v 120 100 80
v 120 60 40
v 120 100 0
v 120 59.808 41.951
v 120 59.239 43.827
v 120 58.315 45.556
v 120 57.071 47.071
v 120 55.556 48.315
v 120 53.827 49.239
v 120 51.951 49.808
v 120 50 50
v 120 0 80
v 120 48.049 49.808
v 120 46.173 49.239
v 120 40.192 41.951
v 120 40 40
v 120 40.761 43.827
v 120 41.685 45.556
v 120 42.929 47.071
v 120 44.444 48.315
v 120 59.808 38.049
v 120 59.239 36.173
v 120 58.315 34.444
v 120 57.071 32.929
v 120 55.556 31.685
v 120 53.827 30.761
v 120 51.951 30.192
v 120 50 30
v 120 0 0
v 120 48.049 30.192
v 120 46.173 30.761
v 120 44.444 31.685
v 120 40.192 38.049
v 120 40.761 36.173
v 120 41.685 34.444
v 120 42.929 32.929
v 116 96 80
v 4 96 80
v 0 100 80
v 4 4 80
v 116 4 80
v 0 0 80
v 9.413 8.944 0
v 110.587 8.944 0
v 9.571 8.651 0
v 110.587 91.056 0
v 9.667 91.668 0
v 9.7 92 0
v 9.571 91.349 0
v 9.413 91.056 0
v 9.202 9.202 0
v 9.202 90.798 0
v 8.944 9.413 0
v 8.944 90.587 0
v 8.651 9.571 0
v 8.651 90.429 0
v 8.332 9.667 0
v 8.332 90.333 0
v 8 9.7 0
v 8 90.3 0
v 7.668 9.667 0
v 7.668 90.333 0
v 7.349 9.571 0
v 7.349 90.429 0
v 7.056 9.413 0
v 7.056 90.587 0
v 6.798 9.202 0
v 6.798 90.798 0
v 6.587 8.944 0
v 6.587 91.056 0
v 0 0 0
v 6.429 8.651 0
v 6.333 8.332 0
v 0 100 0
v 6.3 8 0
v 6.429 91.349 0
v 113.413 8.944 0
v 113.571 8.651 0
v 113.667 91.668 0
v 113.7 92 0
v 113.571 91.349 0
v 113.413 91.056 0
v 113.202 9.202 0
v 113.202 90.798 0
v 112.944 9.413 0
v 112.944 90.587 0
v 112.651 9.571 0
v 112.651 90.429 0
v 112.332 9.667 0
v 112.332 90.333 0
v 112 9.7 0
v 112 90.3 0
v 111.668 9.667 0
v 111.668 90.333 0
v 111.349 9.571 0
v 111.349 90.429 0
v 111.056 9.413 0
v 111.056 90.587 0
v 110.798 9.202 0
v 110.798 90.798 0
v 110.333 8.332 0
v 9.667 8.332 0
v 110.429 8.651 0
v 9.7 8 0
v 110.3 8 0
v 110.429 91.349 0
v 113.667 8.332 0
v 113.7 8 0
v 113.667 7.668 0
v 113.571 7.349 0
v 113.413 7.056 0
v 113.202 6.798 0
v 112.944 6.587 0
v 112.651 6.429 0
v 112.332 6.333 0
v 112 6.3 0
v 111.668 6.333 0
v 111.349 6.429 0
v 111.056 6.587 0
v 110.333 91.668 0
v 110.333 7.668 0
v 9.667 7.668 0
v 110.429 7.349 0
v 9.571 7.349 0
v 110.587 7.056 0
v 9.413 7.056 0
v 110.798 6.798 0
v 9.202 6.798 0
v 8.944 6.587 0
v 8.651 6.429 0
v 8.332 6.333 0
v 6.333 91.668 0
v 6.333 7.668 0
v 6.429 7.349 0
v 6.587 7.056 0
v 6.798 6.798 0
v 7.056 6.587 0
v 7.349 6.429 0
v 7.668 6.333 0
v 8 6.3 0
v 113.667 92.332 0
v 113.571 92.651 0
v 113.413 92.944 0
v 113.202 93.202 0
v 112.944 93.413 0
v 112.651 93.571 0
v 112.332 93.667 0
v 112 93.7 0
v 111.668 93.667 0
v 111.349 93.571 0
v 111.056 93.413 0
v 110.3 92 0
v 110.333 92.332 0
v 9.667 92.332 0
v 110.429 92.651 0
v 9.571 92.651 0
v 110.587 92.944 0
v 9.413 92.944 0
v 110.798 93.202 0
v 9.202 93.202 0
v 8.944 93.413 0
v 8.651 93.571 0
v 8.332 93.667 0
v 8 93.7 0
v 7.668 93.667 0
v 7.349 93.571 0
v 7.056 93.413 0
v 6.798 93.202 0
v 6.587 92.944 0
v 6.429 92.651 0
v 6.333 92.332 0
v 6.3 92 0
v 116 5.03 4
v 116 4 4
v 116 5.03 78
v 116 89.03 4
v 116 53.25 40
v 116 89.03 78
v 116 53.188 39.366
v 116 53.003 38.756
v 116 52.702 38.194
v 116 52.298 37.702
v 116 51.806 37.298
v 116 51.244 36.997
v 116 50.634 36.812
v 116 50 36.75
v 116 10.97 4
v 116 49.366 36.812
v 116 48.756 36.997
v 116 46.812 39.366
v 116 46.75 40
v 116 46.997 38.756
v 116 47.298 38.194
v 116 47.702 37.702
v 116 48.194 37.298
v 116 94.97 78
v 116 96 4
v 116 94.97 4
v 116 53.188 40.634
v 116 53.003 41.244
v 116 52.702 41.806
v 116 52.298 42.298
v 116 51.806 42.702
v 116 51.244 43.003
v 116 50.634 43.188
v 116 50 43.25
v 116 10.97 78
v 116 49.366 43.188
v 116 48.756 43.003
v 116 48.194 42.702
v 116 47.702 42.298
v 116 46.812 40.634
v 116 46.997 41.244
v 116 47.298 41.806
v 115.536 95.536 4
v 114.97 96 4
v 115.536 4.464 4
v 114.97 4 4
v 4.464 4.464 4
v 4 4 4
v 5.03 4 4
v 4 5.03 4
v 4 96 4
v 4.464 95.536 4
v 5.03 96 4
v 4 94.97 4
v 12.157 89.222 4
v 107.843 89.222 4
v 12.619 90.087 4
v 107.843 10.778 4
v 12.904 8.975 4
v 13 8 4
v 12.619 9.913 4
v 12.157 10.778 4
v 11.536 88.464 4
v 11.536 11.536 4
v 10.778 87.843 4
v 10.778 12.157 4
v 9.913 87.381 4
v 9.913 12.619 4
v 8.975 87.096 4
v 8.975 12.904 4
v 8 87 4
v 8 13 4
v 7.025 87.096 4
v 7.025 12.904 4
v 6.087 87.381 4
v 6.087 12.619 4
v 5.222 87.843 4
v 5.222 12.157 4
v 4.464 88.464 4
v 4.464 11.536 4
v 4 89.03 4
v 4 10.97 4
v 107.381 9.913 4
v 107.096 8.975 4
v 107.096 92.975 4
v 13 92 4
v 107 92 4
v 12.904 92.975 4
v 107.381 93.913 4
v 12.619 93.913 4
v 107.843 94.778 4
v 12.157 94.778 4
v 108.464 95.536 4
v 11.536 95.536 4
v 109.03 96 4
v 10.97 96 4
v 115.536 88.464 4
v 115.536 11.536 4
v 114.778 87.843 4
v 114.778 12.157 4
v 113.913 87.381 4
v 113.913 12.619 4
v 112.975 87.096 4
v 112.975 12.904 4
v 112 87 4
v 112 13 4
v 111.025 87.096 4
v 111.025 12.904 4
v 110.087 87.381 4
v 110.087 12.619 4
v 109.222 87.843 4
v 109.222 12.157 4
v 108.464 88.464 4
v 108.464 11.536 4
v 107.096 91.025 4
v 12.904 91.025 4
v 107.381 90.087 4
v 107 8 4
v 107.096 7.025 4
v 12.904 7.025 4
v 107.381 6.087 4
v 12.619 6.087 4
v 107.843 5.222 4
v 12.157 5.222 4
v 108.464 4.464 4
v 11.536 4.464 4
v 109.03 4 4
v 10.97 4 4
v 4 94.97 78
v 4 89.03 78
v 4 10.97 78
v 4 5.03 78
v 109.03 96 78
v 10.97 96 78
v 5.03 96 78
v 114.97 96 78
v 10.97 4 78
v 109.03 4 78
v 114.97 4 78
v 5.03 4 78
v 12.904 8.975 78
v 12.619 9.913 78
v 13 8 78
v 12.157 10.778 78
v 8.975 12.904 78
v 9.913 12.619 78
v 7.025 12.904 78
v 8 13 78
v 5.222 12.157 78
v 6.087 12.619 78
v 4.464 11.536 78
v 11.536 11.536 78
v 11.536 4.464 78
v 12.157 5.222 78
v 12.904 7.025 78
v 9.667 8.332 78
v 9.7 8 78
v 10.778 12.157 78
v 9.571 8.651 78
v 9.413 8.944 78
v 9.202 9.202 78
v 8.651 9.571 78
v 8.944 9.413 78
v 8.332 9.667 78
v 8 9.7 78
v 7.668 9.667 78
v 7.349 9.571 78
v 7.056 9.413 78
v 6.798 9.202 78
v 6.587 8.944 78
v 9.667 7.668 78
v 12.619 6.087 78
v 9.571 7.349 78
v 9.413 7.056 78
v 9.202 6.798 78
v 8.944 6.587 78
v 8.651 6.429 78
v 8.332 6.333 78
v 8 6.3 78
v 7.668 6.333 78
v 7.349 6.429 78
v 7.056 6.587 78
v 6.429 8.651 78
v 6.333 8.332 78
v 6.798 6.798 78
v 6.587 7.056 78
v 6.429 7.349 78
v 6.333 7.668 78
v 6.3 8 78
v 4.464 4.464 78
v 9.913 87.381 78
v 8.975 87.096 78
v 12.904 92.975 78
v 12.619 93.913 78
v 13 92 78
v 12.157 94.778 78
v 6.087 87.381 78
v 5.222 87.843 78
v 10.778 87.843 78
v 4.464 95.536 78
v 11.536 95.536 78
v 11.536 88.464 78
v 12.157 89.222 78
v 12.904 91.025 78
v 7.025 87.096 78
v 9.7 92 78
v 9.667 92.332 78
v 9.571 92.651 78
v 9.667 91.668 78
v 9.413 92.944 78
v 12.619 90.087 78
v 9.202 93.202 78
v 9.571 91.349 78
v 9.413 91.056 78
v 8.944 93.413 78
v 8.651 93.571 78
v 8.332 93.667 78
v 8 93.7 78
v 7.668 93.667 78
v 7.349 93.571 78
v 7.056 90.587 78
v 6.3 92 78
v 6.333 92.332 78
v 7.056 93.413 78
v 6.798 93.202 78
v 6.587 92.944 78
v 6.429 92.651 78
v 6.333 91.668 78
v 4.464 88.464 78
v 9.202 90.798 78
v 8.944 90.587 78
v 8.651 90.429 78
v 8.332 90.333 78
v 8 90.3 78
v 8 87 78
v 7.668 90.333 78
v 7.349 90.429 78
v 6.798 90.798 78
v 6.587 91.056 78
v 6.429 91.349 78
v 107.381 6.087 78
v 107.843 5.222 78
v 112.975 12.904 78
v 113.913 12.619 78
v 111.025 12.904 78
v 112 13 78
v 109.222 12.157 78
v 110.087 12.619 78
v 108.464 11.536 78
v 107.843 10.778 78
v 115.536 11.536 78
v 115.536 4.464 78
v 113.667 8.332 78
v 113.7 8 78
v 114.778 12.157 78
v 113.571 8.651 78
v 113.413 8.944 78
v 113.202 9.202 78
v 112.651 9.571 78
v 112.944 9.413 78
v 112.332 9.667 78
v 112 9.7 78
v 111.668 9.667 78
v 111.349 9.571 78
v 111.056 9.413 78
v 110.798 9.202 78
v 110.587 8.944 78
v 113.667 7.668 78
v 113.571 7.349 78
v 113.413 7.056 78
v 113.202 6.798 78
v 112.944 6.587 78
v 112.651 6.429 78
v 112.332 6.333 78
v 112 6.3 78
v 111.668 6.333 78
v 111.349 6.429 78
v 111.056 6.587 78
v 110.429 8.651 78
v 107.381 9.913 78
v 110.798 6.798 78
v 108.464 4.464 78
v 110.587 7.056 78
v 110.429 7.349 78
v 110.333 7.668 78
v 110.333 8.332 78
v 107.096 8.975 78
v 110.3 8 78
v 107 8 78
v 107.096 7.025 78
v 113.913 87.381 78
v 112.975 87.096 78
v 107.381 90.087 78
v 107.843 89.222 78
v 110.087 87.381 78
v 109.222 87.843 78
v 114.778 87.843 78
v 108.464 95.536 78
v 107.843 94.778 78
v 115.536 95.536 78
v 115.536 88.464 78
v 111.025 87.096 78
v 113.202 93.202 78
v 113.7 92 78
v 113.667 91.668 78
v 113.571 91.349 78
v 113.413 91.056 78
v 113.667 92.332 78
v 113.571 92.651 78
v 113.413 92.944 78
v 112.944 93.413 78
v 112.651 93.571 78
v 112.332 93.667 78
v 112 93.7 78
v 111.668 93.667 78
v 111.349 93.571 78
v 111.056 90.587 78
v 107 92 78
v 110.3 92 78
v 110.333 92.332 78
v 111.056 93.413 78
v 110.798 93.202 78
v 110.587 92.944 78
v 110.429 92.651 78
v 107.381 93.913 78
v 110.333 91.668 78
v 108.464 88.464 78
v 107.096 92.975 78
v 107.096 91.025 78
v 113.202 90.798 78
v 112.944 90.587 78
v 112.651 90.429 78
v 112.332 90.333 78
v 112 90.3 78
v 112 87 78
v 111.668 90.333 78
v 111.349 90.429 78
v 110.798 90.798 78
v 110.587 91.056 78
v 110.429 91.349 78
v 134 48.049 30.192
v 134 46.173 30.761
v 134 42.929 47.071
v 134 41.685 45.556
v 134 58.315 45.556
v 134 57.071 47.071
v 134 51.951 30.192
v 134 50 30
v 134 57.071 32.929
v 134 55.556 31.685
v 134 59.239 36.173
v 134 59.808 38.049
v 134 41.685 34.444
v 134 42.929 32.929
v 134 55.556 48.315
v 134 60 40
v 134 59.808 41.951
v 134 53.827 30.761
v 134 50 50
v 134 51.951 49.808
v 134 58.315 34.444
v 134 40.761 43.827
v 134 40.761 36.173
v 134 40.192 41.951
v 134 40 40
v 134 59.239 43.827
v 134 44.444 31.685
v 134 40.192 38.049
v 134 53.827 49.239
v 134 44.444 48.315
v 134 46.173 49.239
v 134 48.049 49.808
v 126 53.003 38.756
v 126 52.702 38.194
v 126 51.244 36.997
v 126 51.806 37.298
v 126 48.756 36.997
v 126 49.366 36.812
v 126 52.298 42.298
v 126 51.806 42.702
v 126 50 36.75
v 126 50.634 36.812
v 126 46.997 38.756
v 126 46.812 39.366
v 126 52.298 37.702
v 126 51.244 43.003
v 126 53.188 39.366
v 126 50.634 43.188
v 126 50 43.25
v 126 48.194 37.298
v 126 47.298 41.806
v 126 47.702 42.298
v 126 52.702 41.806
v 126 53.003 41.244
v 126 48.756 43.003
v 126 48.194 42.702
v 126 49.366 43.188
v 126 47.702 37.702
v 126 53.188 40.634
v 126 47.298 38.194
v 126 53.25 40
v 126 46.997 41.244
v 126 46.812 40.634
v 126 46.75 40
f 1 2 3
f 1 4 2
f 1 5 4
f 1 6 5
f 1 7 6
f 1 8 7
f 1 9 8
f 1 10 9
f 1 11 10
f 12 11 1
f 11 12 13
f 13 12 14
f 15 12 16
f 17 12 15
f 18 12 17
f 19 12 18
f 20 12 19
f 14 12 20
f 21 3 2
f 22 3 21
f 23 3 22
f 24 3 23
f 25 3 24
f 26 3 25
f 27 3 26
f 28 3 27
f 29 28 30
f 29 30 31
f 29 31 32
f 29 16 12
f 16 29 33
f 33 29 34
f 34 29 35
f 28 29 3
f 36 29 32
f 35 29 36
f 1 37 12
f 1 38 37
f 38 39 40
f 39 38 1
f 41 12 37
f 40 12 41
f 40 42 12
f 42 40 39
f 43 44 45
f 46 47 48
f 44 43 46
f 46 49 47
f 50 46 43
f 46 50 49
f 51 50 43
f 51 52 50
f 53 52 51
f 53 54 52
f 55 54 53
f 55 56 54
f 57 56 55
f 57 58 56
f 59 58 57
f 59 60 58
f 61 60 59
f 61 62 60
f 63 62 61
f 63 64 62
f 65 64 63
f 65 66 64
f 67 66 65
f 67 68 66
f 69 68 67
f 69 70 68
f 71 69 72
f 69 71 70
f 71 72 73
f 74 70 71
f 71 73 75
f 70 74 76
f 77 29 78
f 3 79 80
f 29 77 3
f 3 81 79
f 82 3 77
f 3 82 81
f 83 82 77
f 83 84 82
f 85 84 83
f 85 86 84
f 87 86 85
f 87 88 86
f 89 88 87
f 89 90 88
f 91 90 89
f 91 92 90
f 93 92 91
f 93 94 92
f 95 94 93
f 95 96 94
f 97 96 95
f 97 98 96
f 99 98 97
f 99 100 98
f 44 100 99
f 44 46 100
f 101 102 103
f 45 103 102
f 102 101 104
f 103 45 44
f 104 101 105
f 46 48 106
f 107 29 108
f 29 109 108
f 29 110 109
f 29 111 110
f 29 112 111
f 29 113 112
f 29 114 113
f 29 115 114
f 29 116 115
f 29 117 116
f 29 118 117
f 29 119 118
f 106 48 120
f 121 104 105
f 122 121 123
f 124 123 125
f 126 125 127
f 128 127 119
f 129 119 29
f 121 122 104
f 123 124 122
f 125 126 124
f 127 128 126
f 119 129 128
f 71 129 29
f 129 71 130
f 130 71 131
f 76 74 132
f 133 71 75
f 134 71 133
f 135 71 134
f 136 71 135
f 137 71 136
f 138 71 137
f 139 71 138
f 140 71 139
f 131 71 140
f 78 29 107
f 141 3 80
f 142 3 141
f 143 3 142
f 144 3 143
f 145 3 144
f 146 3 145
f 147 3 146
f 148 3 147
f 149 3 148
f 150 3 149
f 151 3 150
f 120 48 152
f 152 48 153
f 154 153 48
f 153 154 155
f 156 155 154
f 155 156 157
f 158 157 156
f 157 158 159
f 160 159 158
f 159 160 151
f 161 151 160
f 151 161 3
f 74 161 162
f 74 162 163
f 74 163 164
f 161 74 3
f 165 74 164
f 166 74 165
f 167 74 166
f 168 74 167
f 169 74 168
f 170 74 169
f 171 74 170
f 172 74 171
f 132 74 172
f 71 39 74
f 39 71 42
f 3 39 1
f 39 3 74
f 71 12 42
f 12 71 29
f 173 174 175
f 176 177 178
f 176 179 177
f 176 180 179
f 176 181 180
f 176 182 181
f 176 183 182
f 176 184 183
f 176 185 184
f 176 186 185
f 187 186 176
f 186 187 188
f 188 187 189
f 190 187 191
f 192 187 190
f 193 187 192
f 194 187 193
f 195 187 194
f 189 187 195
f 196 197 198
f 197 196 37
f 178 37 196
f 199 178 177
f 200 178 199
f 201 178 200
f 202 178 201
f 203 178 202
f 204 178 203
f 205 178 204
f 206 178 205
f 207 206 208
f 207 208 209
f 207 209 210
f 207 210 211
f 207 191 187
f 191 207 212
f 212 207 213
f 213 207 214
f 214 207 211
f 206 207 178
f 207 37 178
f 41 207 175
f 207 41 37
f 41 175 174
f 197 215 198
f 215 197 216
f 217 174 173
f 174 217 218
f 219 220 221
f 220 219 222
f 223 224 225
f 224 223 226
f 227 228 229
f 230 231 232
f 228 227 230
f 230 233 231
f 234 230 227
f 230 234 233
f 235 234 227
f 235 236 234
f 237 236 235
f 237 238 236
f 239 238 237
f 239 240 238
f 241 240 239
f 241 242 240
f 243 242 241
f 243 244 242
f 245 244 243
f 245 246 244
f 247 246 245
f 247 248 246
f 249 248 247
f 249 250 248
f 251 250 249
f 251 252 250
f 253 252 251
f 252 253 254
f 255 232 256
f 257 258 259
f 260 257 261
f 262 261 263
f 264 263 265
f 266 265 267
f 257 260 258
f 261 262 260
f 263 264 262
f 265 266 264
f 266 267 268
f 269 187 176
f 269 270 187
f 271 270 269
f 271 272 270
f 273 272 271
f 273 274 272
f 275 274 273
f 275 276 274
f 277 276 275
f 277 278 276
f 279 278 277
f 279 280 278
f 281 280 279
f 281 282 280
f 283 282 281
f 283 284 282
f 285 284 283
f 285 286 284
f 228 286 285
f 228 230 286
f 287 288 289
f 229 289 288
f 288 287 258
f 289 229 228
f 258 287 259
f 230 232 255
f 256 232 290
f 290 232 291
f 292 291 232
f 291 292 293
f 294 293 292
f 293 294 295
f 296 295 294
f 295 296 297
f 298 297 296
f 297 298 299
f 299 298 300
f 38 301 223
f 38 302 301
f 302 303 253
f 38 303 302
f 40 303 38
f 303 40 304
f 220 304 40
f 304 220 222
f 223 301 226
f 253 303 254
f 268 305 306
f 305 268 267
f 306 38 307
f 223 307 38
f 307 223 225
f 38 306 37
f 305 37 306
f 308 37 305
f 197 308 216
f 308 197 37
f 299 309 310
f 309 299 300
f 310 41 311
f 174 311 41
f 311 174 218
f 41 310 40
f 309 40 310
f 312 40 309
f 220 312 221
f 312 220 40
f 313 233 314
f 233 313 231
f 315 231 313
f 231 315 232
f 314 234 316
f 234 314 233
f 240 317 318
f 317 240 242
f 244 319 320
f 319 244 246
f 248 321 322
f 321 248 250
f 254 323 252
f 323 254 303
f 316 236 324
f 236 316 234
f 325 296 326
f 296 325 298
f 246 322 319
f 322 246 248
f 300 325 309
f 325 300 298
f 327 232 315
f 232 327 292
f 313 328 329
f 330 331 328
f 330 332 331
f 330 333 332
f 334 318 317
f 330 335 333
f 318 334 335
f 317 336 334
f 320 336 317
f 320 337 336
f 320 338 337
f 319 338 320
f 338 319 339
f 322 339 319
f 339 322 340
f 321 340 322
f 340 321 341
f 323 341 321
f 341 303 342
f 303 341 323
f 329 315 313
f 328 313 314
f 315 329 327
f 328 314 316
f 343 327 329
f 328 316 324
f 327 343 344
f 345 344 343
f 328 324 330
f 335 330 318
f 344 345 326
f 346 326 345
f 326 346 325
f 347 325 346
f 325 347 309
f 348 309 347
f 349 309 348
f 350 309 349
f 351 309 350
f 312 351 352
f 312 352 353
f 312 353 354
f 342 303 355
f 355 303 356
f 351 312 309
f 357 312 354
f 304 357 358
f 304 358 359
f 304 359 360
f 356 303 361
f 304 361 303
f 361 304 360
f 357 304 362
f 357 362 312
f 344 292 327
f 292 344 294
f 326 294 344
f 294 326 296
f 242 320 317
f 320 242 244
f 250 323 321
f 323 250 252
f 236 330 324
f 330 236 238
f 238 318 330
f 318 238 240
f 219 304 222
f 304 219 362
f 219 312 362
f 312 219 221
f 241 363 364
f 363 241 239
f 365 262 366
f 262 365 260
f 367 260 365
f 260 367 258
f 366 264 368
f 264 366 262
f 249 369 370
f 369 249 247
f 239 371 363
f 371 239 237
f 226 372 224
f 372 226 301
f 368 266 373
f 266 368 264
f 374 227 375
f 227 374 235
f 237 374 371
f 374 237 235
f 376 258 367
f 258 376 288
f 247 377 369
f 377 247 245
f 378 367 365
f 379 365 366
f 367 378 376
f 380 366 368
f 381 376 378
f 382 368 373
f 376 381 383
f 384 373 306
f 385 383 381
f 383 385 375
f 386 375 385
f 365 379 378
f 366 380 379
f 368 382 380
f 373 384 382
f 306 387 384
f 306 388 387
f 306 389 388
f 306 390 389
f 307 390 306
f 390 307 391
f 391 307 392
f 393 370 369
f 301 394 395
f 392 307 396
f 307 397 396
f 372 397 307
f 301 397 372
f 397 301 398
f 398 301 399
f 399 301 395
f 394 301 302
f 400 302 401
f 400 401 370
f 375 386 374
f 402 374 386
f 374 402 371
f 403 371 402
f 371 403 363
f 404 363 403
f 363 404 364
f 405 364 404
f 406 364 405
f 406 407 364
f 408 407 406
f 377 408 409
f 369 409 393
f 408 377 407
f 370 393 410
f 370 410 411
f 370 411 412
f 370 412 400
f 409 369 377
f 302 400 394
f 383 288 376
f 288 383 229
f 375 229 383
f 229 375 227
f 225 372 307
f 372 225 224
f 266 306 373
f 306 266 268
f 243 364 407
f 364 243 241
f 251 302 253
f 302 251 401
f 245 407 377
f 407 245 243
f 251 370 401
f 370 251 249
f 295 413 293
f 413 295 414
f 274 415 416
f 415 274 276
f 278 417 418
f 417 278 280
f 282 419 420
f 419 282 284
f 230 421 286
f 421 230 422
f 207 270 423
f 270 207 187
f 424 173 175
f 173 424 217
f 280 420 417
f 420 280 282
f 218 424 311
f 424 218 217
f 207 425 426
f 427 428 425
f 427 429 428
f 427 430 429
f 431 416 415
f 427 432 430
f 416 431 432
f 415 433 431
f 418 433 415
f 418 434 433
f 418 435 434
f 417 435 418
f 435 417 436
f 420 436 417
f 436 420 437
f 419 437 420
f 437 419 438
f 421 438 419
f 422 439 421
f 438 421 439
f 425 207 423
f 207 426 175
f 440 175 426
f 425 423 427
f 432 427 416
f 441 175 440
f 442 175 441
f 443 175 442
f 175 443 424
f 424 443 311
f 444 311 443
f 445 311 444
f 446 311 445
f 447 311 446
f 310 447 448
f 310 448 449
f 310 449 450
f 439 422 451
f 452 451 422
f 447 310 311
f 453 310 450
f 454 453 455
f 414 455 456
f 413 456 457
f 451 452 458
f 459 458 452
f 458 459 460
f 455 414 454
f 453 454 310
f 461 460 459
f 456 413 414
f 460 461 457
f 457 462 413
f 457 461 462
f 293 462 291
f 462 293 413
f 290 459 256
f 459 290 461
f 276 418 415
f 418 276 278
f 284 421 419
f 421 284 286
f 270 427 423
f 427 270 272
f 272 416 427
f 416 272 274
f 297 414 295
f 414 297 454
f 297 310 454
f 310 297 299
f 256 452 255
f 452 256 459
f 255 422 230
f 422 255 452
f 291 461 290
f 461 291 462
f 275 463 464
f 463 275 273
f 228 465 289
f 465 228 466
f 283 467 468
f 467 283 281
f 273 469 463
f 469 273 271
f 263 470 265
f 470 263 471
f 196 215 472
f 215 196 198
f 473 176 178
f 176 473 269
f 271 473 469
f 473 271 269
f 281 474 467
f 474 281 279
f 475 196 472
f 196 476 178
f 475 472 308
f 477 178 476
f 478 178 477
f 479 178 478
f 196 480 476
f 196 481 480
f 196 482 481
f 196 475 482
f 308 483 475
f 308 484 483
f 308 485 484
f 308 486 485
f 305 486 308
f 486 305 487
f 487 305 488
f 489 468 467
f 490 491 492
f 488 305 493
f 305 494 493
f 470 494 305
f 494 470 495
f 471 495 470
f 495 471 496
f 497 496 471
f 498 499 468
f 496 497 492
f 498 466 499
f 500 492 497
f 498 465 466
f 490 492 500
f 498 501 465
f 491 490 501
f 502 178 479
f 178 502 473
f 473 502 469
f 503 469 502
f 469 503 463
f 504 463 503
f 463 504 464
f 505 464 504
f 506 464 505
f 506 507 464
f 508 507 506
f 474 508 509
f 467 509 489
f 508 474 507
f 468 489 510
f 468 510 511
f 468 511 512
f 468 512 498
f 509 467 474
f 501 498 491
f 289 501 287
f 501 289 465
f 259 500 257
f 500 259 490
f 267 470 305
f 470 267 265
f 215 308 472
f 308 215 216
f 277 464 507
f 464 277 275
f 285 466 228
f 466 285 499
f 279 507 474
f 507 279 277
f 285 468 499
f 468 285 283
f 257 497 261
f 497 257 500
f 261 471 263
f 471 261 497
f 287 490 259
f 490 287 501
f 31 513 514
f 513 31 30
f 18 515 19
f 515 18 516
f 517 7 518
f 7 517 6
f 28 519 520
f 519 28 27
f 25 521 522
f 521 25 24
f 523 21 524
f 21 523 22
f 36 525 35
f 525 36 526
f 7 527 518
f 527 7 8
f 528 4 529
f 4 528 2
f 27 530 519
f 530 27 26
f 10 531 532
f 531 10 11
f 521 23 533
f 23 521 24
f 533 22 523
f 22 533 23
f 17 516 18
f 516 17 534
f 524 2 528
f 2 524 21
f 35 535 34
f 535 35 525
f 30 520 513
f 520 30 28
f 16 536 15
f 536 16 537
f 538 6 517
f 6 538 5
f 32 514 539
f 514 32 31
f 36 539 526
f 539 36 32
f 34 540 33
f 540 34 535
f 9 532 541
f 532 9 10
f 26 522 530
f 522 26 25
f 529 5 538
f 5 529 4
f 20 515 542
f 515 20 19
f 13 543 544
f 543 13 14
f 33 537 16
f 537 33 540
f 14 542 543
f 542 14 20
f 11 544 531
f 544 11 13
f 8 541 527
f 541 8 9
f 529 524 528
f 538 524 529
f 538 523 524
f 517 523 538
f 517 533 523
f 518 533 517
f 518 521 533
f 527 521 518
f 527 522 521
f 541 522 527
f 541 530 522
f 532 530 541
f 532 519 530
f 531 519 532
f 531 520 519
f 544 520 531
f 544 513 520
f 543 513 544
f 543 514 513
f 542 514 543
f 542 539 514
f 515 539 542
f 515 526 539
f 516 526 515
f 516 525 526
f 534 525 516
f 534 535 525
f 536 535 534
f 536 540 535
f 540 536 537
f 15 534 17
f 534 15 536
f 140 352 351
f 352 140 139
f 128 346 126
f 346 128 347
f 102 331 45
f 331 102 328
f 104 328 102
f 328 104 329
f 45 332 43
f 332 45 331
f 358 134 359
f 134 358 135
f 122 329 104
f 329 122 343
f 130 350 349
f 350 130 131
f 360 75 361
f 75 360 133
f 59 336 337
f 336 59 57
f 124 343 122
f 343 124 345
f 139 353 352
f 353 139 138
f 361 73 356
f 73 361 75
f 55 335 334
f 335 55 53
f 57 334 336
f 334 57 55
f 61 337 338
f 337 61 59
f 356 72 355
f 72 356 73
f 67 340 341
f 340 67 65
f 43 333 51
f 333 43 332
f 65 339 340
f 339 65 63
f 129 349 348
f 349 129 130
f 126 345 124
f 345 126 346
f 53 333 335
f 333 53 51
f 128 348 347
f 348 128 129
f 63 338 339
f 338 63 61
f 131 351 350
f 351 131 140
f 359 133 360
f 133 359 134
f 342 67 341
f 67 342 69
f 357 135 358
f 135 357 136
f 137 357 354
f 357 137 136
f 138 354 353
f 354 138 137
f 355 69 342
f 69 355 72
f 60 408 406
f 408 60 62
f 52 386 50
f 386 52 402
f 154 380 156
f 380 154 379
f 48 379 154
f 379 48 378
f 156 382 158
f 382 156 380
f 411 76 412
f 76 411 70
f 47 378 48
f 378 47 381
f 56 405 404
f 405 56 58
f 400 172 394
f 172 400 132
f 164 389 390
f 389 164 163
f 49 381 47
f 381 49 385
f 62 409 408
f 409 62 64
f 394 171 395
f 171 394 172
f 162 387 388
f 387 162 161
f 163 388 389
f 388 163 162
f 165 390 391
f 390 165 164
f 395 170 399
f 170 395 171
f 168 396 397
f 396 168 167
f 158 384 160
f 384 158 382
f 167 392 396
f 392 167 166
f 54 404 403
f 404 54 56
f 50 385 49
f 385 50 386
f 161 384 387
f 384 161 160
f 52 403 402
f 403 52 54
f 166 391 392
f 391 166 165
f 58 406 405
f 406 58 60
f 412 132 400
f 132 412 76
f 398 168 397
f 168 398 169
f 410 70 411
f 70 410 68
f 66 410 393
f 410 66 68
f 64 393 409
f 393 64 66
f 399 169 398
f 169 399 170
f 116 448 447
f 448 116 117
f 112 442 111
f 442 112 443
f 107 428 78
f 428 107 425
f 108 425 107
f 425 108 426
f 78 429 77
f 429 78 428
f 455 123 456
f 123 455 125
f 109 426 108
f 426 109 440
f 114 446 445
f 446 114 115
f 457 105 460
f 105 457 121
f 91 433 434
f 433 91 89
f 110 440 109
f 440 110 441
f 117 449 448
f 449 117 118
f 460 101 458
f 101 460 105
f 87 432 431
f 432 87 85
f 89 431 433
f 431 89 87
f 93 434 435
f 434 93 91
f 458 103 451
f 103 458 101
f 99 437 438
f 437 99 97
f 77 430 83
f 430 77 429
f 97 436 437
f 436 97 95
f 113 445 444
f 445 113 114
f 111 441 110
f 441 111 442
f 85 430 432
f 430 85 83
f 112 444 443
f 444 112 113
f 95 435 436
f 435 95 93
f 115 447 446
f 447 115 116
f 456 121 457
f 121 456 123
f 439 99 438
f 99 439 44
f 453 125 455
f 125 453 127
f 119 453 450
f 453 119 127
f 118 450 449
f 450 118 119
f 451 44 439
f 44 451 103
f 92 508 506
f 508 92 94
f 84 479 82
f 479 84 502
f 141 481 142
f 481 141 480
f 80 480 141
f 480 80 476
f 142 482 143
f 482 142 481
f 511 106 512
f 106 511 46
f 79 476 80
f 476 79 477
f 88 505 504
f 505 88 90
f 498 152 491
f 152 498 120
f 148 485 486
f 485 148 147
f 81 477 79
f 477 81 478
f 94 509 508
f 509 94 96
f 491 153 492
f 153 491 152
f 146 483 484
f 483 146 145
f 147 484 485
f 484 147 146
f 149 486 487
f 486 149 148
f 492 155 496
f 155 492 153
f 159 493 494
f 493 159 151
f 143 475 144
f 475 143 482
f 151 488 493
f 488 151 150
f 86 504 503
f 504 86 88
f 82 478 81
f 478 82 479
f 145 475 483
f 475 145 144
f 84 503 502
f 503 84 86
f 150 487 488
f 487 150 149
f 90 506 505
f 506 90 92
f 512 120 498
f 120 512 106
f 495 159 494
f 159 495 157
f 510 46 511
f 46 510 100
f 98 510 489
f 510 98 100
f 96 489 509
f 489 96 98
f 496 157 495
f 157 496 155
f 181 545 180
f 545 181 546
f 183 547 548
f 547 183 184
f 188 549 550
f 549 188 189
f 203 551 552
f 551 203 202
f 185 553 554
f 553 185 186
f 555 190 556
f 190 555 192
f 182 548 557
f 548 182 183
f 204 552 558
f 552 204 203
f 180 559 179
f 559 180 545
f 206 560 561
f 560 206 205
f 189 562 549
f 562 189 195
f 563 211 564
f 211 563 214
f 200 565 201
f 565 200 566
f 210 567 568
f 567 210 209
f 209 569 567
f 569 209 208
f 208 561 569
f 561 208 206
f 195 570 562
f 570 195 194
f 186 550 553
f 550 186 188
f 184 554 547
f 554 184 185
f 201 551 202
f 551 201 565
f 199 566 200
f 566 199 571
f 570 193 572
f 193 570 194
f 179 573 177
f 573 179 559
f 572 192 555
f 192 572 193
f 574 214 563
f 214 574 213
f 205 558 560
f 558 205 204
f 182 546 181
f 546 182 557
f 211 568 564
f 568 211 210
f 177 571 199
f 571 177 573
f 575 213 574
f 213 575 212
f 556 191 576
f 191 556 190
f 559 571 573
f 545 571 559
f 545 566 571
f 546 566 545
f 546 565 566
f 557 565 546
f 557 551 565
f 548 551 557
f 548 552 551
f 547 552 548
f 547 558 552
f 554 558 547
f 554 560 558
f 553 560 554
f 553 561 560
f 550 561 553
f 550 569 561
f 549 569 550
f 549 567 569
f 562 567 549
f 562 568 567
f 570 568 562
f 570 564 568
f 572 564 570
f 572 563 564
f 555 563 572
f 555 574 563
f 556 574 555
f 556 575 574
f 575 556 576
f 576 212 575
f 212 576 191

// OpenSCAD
$fn = 32;

// ----------------------------------------------------------------------
// Enclosure body: 120 x 100 x 80 mm, wall 4 mm
// ----------------------------------------------------------------------

// --- parameters (mm) ---
length = 120;             // outside length, X
width = 100;              // outside width, Y
height = 80;              // outside height, Z
wall = 4;                 // side wall thickness
floor_t = 4;              // floor thickness
boss_d = 10;              // corner boss diameter
boss_h = 74;              // corner boss height above the floor
boss_hole_d = 3.4;        // lid screw clearance in the boss
boss_lip = 8;             // boss centre inset from the corner
nipple_d = 20;            // cable gland boss diameter
nipple_h = 14;            // cable gland boss height
nipple_bore = 6.5;        // cable gland bore

module shell() {
  difference() {
    cube([length, width, height]);
    /* hollow, open at the top */
    translate([wall, wall, floor_t])
      cube([length - 2 * wall, width - 2 * wall, height]);
  }
}

module bosses() {
  /* corner bosses, sunk 1 mm into the floor */
  for (sx = [0, 1]) for (sy = [0, 1])
    translate([sx * (length - 2 * boss_lip) + boss_lip, sy * (width - 2 * boss_lip) + boss_lip, floor_t - 1])
      cylinder(h = boss_h + 1, d = boss_d);
}

module gland() {
  /* boss on the short wall, sunk 1 mm into it */
  translate([length - 1, width / 2, height * 0.5]) rotate([0, 90, 0])
    cylinder(h = nipple_h + 1, d = nipple_d);
}

difference() {
  union() {
    shell();
    bosses();
    gland();
  }
  /* boss screw holes */
  for (sx = [0, 1]) for (sy = [0, 1])
    translate([sx * (length - 2 * boss_lip) + boss_lip, sy * (width - 2 * boss_lip) + boss_lip, -1]) cylinder(h = floor_t + boss_h + 2, d = boss_hole_d);
  translate([length, width / 2, height * 0.5]) rotate([0, 90, 0]) translate([0, 0, -nipple_h - 2]) cylinder(h = nipple_h + wall + 4, d = nipple_bore);
}
